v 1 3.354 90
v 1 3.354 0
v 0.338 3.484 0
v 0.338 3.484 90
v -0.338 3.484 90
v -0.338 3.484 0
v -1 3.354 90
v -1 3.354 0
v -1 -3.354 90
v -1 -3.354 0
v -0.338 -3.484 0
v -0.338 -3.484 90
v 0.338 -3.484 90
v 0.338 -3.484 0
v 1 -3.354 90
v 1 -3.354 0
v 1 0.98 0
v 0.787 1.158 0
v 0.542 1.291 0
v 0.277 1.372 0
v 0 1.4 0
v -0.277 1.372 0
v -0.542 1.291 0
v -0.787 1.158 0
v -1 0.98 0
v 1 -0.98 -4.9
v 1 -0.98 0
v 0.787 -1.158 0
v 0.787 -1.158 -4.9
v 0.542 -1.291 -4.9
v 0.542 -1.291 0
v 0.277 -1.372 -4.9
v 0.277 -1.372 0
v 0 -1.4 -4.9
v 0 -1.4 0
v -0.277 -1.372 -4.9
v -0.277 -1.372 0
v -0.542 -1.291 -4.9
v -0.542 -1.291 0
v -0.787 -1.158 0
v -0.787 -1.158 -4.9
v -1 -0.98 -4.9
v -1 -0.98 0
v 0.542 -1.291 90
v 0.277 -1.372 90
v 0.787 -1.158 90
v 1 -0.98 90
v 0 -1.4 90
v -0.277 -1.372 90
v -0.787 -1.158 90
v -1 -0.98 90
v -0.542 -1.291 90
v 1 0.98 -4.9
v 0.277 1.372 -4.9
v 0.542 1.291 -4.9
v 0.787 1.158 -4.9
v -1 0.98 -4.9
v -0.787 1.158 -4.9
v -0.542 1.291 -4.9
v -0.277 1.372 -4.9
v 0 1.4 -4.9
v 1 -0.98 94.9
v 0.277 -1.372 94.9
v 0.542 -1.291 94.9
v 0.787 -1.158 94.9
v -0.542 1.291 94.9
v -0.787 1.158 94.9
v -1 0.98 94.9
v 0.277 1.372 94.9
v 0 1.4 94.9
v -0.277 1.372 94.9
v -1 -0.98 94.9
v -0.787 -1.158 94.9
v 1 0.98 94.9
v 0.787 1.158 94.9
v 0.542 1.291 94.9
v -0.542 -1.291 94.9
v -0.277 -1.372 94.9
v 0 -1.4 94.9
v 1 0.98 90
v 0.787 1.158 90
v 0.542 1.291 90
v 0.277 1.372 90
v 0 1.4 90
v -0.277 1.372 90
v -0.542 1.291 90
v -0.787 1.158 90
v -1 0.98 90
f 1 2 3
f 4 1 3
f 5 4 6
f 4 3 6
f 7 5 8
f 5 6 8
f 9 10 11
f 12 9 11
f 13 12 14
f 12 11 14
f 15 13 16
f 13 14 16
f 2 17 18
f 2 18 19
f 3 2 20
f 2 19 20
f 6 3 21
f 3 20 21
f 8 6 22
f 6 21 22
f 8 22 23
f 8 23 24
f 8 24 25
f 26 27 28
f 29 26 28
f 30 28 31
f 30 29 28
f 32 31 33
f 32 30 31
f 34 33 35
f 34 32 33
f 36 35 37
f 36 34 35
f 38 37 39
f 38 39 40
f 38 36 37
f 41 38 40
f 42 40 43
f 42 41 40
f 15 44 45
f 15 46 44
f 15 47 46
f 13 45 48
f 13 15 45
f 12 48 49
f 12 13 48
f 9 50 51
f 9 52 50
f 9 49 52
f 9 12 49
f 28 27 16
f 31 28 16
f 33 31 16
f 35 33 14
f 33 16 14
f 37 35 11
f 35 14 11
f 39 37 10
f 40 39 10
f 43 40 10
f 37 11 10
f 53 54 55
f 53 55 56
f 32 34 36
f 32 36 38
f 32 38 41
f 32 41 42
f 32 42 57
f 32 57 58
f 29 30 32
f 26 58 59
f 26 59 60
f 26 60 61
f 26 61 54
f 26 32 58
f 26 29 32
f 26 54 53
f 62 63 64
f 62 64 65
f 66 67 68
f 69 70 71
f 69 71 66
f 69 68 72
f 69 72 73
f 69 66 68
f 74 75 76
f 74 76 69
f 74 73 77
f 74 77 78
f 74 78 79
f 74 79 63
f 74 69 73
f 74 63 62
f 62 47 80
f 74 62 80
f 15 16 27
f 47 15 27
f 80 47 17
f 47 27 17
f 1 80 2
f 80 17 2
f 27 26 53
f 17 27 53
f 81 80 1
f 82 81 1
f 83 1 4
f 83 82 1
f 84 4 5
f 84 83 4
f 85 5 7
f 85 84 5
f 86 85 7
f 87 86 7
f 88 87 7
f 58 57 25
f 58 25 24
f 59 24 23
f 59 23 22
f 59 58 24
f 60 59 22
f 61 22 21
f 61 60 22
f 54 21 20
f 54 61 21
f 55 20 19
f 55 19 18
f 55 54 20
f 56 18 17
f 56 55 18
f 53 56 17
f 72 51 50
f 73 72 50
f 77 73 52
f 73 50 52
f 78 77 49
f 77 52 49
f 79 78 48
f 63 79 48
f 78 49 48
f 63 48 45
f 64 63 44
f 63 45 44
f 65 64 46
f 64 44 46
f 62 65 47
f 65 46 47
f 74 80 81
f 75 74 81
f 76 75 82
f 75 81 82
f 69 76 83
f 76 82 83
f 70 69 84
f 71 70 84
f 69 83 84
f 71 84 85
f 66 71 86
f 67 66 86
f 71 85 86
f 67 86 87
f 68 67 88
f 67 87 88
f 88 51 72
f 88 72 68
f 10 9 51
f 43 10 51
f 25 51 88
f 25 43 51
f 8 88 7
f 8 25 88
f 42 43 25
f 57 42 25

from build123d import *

# Parameters (mm, degrees)
SKIZZE1_R                            = 3.5
AUFSATZ_LINEAR_AUSTRAGEN1_DEPTH      = 90
SKIZZE3_R                            = 1.4
AUFSATZ_LINEAR_AUSTRAGEN2_DEPTH      = 4.9
AUFSATZ_LINEAR_START                 = 4.9
SKIZZE4_R                            = 1.4
AUFSATZ_LINEAR_AUSTRAGEN3_DEPTH      = 4.9
SCHNITT_LINEAR_AUSTRAGEN7_DEPTH      = 96.028995575
SCHNITT_LINEAR_AUSTRAGEN7_DEPTH_BACK = 96.028995575
SKIZZE11_W                           = 4.192865468
SKIZZE11_H                           = 8.003816725
SCHNITT_LINEAR_AUSTRAGEN8_DEPTH      = 96.028995575
SCHNITT_LINEAR_AUSTRAGEN8_DEPTH_BACK = 96.028995575
SKIZZE12_W                           = 3.359837997
SKIZZE12_H                           = 7.994786778


with BuildPart() as part:
    # Skizze1 → Aufsatz-Linear austragen1 (new body)
    with BuildSketch(Plane.XY):
        with Locations(Location((0, 0, 0), (0, 0, 180))):
            Circle(SKIZZE1_R)
    extrude(amount=AUFSATZ_LINEAR_AUSTRAGEN1_DEPTH)

    # Skizze3 → Aufsatz-Linear austragen2 (add)
    with BuildSketch(Plane.XY.offset(90)):
        Circle(SKIZZE3_R)
    extrude(amount=AUFSATZ_LINEAR_AUSTRAGEN2_DEPTH)

    # Skizze4 → Aufsatz-Linear austragen3 (add)
    with BuildSketch(Plane(origin=(0, 0, 0), x_dir=(-1, 0, 0), z_dir=(0, 0, -1)).offset(AUFSATZ_LINEAR_START)):
        with Locations(Location((0, 0, 0), (0, 0, 180))):
            Circle(SKIZZE4_R)
    extrude(amount=-AUFSATZ_LINEAR_AUSTRAGEN3_DEPTH)

    # Skizze11 → Schnitt-Linear austragen7 (cut, two sides: drawn at the far end of the back side and taken through both)
    with BuildSketch(Plane.XY.offset(90).offset(-SCHNITT_LINEAR_AUSTRAGEN7_DEPTH_BACK)):
        with Locations((3.096432734, -0.133552217)):
            Rectangle(SKIZZE11_W, SKIZZE11_H)
    extrude(amount=SCHNITT_LINEAR_AUSTRAGEN7_DEPTH + SCHNITT_LINEAR_AUSTRAGEN7_DEPTH_BACK, mode=Mode.SUBTRACT)

    # Skizze12 → Schnitt-Linear austragen8 (cut, two sides: drawn at the far end of the back side and taken through both)
    with BuildSketch(Plane.XY.offset(90).offset(-SCHNITT_LINEAR_AUSTRAGEN8_DEPTH_BACK)):
        with Locations((-2.679918999, -0.138067191)):
            Rectangle(SKIZZE12_W, SKIZZE12_H)
    extrude(amount=SCHNITT_LINEAR_AUSTRAGEN8_DEPTH + SCHNITT_LINEAR_AUSTRAGEN8_DEPTH_BACK, mode=Mode.SUBTRACT)


solid = part.part
